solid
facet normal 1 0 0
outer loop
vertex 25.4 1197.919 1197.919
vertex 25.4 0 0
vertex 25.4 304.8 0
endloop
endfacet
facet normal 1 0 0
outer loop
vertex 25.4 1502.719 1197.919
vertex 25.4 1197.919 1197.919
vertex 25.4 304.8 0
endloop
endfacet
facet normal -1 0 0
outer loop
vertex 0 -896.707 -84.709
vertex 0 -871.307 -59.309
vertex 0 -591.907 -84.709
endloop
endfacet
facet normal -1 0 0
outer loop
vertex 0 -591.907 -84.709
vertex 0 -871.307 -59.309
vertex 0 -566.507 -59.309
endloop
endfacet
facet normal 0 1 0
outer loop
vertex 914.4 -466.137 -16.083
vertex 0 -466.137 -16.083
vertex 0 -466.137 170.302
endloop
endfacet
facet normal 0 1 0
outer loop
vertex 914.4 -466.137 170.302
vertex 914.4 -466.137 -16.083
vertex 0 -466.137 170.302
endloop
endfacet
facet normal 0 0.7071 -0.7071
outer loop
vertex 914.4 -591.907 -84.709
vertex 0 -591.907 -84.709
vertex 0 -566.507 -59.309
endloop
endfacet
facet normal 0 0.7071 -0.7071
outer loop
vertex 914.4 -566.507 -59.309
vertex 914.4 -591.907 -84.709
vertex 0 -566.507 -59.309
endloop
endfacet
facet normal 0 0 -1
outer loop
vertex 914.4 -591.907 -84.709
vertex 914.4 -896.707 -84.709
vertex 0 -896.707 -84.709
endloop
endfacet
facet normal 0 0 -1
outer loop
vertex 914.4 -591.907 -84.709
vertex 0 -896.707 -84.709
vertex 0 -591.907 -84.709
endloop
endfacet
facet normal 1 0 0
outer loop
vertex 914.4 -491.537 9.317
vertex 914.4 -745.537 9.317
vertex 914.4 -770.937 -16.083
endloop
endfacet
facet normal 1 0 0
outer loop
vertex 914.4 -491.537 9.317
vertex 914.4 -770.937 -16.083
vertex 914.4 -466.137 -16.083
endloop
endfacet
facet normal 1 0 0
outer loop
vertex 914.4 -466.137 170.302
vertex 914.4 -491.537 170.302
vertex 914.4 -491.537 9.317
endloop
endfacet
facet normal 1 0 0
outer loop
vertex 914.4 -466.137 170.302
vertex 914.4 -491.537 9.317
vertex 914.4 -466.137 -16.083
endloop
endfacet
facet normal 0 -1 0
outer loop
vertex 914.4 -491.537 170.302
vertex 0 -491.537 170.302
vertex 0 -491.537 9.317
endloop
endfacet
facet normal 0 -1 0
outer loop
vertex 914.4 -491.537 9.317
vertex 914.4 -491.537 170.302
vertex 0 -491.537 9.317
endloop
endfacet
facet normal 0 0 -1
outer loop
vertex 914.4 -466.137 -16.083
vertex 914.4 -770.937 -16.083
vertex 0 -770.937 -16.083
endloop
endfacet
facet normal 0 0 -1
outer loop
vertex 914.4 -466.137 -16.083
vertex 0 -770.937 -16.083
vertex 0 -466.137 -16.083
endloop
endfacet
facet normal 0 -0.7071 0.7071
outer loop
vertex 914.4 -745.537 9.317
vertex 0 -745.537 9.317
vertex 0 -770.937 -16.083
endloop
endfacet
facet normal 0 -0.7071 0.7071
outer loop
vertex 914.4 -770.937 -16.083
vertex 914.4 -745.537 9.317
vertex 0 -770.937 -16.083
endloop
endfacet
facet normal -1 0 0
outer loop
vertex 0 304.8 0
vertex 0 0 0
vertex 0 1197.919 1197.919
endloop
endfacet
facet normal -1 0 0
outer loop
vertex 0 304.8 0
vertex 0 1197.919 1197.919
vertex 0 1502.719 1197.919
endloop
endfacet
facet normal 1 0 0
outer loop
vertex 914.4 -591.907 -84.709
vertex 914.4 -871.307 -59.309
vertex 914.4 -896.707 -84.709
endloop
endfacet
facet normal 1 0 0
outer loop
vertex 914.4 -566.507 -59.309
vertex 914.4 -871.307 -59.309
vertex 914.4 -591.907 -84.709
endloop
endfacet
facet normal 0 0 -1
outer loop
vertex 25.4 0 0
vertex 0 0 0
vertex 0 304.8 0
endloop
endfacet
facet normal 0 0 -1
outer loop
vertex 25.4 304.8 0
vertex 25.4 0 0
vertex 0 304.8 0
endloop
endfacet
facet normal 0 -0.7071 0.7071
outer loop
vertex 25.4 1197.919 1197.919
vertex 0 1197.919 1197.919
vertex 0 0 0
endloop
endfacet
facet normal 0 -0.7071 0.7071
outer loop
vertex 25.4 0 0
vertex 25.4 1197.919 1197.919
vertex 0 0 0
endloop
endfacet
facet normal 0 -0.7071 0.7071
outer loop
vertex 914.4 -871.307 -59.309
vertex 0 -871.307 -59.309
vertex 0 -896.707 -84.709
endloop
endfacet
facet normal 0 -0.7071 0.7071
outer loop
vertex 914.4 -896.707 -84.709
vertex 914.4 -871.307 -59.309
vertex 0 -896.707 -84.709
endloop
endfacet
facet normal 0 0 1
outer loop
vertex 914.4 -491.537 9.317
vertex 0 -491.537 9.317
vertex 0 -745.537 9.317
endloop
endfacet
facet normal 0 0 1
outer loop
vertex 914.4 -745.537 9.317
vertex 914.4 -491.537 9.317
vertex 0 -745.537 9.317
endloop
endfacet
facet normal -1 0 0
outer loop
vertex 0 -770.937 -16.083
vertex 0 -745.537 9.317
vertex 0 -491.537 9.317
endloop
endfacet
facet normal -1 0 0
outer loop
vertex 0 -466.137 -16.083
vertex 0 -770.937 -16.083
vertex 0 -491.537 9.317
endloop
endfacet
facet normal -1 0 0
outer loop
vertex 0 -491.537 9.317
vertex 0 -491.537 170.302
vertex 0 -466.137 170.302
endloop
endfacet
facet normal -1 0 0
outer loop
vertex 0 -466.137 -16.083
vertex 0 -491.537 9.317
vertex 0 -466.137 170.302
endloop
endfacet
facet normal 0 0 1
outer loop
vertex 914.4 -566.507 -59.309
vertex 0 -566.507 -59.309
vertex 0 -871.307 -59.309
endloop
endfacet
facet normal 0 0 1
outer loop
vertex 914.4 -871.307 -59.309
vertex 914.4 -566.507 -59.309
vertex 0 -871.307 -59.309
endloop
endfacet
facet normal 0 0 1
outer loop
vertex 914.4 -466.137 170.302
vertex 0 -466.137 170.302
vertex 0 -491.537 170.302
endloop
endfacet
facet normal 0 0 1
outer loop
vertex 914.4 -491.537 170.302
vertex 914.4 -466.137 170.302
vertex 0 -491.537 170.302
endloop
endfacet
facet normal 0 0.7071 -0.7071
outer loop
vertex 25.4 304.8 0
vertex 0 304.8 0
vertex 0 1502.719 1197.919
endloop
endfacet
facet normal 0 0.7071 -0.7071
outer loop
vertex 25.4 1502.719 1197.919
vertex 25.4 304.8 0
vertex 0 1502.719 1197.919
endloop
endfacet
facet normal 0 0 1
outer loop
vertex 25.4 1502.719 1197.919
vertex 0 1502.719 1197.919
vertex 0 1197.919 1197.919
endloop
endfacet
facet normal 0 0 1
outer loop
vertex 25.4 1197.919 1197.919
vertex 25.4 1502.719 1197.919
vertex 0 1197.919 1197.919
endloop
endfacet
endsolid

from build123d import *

# Parameters (mm, degrees)
F1_DEPTH = 25.4
F3_DEPTH = 914.4
F5_DEPTH = 914.4


with BuildPart() as f1:
    # F0 (on Right) → F1 (new body)
    with BuildSketch(Plane.YZ):
        Polygon((0, 0), (304.8, 0), (1502.719472, 1197.919472), (1197.919472, 1197.919472), align=None)
    extrude(amount=F1_DEPTH)


with BuildPart() as f3:
    # F2 (on Right) → F3 (new body)
    with BuildSketch(Plane.YZ):
        Polygon((-871.307312, -59.309483), (-896.707312, -84.709483), (-591.907312, -84.709483), (-566.507312, -59.309483), align=None)
    extrude(amount=F3_DEPTH)


with BuildPart() as f5:
    # F4 (on Right) → F5 (new body)
    with BuildSketch(Plane.YZ):
        Polygon((-745.536959, 9.317173), (-770.936959, -16.082827), (-466.136959, -16.082827), (-466.136959, 170.302373), (-491.536959, 170.302373), (-491.536959, 9.317173), align=None)
    extrude(amount=F5_DEPTH)


solid = Compound([f1.part, f3.part, f5.part])
